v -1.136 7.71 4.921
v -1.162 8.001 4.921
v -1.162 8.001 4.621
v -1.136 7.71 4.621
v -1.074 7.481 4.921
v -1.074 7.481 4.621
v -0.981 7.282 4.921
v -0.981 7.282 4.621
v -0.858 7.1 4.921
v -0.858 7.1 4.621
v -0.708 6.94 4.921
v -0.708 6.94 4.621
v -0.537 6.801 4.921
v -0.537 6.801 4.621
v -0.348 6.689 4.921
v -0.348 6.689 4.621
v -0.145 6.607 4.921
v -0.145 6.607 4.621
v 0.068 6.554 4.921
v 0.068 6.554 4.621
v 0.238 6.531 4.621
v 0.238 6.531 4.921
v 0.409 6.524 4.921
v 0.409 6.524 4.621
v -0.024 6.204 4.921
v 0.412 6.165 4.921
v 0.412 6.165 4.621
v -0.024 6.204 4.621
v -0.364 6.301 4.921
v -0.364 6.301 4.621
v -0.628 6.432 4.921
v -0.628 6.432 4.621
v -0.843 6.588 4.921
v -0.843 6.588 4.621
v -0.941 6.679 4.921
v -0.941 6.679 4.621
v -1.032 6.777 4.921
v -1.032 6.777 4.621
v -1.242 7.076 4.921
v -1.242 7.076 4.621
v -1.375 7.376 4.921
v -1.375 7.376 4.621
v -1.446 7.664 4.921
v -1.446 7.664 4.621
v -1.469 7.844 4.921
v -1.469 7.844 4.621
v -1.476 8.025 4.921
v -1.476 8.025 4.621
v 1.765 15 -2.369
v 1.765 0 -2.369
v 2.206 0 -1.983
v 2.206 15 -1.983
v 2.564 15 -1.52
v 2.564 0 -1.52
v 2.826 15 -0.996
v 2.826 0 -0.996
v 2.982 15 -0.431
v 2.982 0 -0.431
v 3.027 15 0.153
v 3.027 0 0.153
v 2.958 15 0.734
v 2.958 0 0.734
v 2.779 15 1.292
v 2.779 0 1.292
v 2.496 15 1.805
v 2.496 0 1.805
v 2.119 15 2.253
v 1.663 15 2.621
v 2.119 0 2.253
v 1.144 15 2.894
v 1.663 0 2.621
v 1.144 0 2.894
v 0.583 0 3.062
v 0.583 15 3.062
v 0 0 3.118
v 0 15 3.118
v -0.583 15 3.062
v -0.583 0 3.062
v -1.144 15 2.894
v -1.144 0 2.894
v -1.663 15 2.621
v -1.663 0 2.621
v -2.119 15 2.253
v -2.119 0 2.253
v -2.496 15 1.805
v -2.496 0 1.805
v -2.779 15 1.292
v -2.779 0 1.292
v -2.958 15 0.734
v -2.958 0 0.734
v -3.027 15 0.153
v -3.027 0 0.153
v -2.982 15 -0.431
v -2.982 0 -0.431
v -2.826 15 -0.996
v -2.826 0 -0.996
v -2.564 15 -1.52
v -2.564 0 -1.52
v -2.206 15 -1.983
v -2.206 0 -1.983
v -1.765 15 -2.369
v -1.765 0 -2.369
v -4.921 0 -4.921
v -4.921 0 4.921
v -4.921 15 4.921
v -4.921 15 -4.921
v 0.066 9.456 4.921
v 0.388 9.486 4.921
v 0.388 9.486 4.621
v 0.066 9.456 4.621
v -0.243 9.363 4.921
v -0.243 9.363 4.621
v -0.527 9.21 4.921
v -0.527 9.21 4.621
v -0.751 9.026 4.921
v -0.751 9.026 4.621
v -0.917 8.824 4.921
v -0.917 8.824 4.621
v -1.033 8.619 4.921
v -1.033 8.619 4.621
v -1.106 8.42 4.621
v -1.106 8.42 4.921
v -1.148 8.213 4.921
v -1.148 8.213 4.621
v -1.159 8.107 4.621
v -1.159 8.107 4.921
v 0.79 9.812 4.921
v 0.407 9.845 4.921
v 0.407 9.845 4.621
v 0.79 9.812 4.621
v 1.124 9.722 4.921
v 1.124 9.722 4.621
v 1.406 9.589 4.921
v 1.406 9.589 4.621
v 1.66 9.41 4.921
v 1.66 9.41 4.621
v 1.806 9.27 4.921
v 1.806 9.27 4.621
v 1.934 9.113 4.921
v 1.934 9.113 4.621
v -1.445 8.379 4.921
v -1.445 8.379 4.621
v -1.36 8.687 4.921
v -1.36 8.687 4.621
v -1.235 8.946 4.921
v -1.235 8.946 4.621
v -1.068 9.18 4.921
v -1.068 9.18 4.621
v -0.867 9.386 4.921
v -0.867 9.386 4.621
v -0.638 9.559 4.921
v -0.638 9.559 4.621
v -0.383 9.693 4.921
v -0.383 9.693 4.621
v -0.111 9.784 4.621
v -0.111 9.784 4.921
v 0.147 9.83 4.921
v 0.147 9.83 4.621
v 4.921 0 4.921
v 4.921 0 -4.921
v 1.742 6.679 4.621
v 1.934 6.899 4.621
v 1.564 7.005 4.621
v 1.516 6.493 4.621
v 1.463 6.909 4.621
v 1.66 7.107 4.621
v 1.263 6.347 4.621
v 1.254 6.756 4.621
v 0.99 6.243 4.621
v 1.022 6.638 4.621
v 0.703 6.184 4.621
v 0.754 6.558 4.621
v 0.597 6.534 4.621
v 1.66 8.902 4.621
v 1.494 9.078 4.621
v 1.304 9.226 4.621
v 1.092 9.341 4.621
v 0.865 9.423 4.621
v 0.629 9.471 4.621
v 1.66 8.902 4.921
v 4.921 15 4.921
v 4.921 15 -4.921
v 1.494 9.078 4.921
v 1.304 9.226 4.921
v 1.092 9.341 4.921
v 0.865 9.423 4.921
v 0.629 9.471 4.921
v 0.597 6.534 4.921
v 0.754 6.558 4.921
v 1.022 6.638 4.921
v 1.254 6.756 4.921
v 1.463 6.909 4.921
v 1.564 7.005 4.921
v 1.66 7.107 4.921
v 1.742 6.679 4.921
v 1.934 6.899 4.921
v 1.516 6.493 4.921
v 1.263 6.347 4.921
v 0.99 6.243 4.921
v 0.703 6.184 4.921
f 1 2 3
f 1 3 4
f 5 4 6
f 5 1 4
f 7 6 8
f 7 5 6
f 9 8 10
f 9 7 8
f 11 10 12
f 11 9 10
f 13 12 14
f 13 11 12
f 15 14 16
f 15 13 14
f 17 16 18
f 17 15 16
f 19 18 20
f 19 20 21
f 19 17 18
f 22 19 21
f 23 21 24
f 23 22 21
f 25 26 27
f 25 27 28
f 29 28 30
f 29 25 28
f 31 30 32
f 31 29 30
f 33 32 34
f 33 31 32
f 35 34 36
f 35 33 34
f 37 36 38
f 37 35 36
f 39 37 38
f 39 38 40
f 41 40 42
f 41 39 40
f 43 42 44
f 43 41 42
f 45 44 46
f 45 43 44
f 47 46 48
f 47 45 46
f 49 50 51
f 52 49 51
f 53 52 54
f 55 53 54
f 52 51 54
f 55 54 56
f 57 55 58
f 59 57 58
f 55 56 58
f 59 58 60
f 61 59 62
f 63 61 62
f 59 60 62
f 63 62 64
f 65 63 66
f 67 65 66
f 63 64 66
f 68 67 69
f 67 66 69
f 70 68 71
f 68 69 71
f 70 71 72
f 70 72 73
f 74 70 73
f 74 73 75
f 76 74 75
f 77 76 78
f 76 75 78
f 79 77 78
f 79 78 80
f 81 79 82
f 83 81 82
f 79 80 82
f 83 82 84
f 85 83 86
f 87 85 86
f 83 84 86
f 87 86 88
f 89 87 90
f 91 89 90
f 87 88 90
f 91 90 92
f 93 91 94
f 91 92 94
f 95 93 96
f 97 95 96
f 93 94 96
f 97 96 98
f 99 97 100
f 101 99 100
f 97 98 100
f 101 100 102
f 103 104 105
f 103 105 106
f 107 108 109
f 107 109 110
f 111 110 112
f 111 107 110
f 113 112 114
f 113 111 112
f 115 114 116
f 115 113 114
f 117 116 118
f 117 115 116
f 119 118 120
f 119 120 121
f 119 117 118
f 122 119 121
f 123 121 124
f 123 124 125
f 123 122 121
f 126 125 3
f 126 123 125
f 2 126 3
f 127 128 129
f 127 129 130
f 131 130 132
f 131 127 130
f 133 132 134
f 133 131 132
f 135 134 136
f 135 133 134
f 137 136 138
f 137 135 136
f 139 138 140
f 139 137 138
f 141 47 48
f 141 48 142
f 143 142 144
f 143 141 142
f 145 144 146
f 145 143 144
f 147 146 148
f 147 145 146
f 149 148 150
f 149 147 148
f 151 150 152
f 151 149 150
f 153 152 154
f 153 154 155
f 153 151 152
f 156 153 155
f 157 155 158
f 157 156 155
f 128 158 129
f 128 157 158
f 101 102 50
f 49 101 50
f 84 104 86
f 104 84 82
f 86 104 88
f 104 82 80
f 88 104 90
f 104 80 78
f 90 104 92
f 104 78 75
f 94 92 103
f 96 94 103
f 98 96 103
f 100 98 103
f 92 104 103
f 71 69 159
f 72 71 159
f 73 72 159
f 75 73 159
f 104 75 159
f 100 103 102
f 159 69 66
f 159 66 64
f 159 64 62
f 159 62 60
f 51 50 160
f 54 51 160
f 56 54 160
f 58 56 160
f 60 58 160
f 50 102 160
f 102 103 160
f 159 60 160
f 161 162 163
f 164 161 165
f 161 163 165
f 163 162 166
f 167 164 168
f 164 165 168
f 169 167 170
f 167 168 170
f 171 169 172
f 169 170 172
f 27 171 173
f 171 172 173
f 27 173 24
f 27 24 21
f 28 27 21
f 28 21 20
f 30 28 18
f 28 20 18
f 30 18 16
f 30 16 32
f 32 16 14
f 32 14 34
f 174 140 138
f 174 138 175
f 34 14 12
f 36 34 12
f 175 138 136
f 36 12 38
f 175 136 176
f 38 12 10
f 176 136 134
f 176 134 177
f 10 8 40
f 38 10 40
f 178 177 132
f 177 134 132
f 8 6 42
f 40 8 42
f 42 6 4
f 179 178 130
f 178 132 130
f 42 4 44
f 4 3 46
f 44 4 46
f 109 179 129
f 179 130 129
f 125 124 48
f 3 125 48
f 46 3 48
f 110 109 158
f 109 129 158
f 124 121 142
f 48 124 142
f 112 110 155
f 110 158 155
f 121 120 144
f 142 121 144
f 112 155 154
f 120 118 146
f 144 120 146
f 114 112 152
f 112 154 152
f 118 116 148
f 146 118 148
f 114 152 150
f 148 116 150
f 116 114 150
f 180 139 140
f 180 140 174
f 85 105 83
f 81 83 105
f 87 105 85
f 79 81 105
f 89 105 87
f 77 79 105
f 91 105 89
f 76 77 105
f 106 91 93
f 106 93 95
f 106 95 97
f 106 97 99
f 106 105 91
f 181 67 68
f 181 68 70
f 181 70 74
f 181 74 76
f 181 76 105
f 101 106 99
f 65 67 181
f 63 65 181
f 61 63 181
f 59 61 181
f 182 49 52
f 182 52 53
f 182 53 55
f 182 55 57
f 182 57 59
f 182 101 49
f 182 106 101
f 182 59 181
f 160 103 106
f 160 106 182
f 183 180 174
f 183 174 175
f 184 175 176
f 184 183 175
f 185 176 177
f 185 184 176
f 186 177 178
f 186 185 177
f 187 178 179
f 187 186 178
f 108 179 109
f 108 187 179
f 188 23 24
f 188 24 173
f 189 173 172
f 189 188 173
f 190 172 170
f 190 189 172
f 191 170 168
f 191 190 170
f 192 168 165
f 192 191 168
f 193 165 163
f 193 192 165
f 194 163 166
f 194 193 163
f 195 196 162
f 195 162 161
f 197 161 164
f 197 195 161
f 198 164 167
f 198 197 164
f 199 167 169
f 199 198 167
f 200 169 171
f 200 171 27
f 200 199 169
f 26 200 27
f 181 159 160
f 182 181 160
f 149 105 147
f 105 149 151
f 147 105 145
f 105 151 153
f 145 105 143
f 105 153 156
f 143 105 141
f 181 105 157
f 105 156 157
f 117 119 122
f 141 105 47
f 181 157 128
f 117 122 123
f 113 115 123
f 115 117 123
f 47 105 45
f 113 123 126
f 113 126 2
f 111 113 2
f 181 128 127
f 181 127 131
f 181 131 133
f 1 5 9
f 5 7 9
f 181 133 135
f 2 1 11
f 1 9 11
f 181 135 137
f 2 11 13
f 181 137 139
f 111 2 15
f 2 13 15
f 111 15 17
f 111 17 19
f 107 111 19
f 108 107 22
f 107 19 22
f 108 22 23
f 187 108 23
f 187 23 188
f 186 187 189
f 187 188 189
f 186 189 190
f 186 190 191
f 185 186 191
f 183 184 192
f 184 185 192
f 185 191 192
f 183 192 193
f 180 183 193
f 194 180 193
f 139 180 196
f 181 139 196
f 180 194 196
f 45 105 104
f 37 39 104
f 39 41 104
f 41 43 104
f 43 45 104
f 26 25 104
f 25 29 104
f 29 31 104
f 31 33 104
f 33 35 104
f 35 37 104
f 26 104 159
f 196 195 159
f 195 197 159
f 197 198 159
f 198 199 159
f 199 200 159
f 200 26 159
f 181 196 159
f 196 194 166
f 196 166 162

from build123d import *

# Parameters (mm, degrees)
SKETCH1_W           = 9.84142284
SKETCH1_H           = 9.84142284
BOSS_EXTRUDE1_DEPTH = 15
CUT_EXTRUDE1_DEPTH  = 0.3


with BuildPart() as part:
    # Sketch1 → Boss-Extrude1 (new body)
    with BuildSketch(Plane(origin=(0, 0, 0), x_dir=(1, 0, 0), z_dir=(0, 1, 0))):
        Rectangle(SKETCH1_W, SKETCH1_H)
        with BuildLine():
            Line((-1.765045048, 2.369444822), (1.765045048, 2.369444822))
            ThreePointArc((1.765045048, 2.369444822), (0, -3.118257941), (-1.765045048, 2.369444822))
        make_face(mode=Mode.SUBTRACT)
    extrude(amount=BOSS_EXTRUDE1_DEPTH)

    # Sketch2 → Cut-Extrude1 (cut)
    with BuildSketch(Plane.XY.offset(4.92071142)):
        with BuildLine():
            Line((1.934406803, 9.11261109), (1.659567059, 8.902274552))
            add(Edge.make_bspline(
                [(1.659567059, 8.902274552), (1.639961171, 8.925640522), (1.601013724, 8.972057437), (1.538354521, 9.037236982), (1.473052878, 9.098302243), (1.405133757, 9.155544123), (1.333374638, 9.206960889), (1.259513839, 9.255231992), (1.182315794, 9.29849973), (1.075564059, 9.350962716), (0.935916211, 9.405708871), (0.760121372, 9.451612102), (0.576610273, 9.480833278), (0.451412674, 9.483998119), (0.387732123, 9.485607885)],
                knots=[0, 0, 0, 0, 9.1485e-05, 0.000181737, 0.000271024, 0.000359627, 0.000447979, 0.000535687, 0.000624217, 0.000713268, 0.000892422, 0.00107303, 0.001257466, 0.001448389, 0.001448389, 0.001448389, 0.001448389], degree=3))
            add(Edge.make_bspline(
                [(0.387732123, 9.485607885), (0.352648824, 9.485203923), (0.282807831, 9.484399747), (0.179159358, 9.473790622), (0.077446307, 9.458879412), (-0.02226516, 9.436754088), (-0.119848118, 9.408781469), (-0.21594052, 9.375356055), (-0.30915112, 9.334001215), (-0.400769358, 9.288292956), (-0.488548569, 9.236665511), (-0.571603617, 9.180352159), (-0.649631585, 9.119983062), (-0.722694197, 9.055331956), (-0.790866145, 8.986689996), (-0.853653456, 8.913325654), (-0.910838867, 8.83547348), (-0.963555892, 8.754160073), (-1.010768625, 8.669622281), (-1.050298504, 8.581547211), (-1.085303627, 8.491443108), (-1.113002869, 8.398291947), (-1.134927386, 8.302749181), (-1.150055049, 8.204558393), (-1.160543521, 8.103924714), (-1.161343697, 8.035715401), (-1.161747044, 8.001333045)],
                knots=[0, 0, 0, 0, 0.000105206, 0.000209435, 0.000312261, 0.00041348, 0.000515565, 0.000616682, 0.000718413, 0.000821258, 0.000923708, 0.001023662, 0.001122111, 0.001219464, 0.00131614, 0.001412112, 0.001508869, 0.001605718, 0.001702691, 0.001799013, 0.001895107, 0.001992482, 0.002090281, 0.00218895, 0.002290387, 0.00239349, 0.00239349, 0.00239349, 0.00239349], degree=3))
            add(Edge.make_bspline(
                [(-1.161747044, 8.001333045), (-1.160485225, 7.949601726), (-1.15800781, 7.848034141), (-1.135959476, 7.69926353), (-1.102454385, 7.556742856), (-1.052238808, 7.421363014), (-0.990319757, 7.291454656), (-0.912079146, 7.169215803), (-0.821462609, 7.052799238), (-0.717188189, 6.94495629), (-0.602782373, 6.846442565), (-0.480034462, 6.759691983), (-0.349250174, 6.687377101), (-0.211873544, 6.627201155), (-0.06684743, 6.580944427), (0.085567373, 6.548380303), (0.245039368, 6.527138123), (0.354008768, 6.525104435), (0.409466899, 6.524069424)],
                knots=[0, 0, 0, 0, 0.000155106, 0.000304531, 0.000450265, 0.000593548, 0.000736853, 0.000881182, 0.001028026, 0.001178769, 0.001330408, 0.001480379, 0.001628835, 0.001777978, 0.001929641, 0.002084627, 0.002245075, 0.00241136, 0.00241136, 0.00241136, 0.00241136], degree=3))
            add(Edge.make_bspline(
                [(0.409466899, 6.524069424), (0.470569588, 6.525758203), (0.590834297, 6.529082126), (0.767202323, 6.557241375), (0.936038089, 6.602899293), (1.097350675, 6.666797215), (1.250685321, 6.749862503), (1.396281982, 6.850560381), (1.534263552, 6.969848713), (1.617234834, 7.060931842), (1.659567059, 7.107402757)],
                knots=[0, 0, 0, 0, 0.00018322, 0.00036062, 0.000534275, 0.000707044, 0.000879893, 0.001056289, 0.001237208, 0.001425665, 0.001425665, 0.001425665, 0.001425665], degree=3))
            Line((1.659567059, 7.107402757), (1.934406803, 6.899169584))
            add(Edge.make_bspline(
                [(1.934406803, 6.899169584), (1.912288693, 6.870631132), (1.868158417, 6.813690926), (1.7967004, 6.733419216), (1.721423103, 6.65791518), (1.641767393, 6.587787559), (1.558649601, 6.521633094), (1.470577289, 6.461331262), (1.378708257, 6.406040378), (1.283353778, 6.355413454), (1.184615165, 6.310496207), (1.08261073, 6.272042439), (0.977780154, 6.238917549), (0.870118646, 6.211665612), (0.759402889, 6.190394529), (0.646032415, 6.176174854), (0.52976254, 6.166432939), (0.451321119, 6.165545024), (0.411570264, 6.165095065)],
                knots=[0, 0, 0, 0, 0.000108293, 0.000216068, 0.000322162, 0.000427957, 0.000534281, 0.00064066, 0.000747915, 0.000855806, 0.000964371, 0.001073102, 0.001182643, 0.001294024, 0.001406092, 0.001520624, 0.001636667, 0.001755891, 0.001755891, 0.001755891, 0.001755891], degree=3))
            add(Edge.make_bspline(
                [(0.411570264, 6.165095065), (0.373926597, 6.165357057), (0.299490907, 6.165875115), (0.189592155, 6.174267282), (0.082602575, 6.185717019), (-0.021172051, 6.20295715), (-0.122298026, 6.22330149), (-0.219858611, 6.250572747), (-0.314813821, 6.281121914), (-0.406782162, 6.3170269), (-0.495841862, 6.357543083), (-0.581705673, 6.403334642), (-0.664334105, 6.454016507), (-0.744539526, 6.508471517), (-0.82113711, 6.568448819), (-0.894790635, 6.633115453), (-0.965913112, 6.702253464), (-1.009915797, 6.752108317), (-1.032039512, 6.777174392)],
                knots=[0, 0, 0, 0, 0.0001129, 0.000223246, 0.000330481, 0.000435603, 0.000538732, 0.000639764, 0.000739316, 0.000837878, 0.000935767, 0.001032686, 0.001129604, 0.00122645, 0.001323362, 0.001421241, 0.001520399, 0.001620667, 0.001620667, 0.001620667, 0.001620667], degree=3))
            add(Edge.make_bspline(
                [(-1.032039512, 6.777174392), (-1.067475155, 6.82071558), (-1.137918632, 6.907272291), (-1.228044315, 7.047558272), (-1.305191871, 7.194026481), (-1.367567791, 7.34744641), (-1.416330525, 7.507473797), (-1.45011172, 7.674189311), (-1.472063324, 7.847437254), (-1.474573613, 7.965274042), (-1.475849608, 8.025171186)],
                knots=[0, 0, 0, 0, 0.000168306, 0.00033458, 0.000499224, 0.000664315, 0.00083066, 0.00100034, 0.001174094, 0.001353718, 0.001353718, 0.001353718, 0.001353718], degree=3))
            add(Edge.make_bspline(
                [(-1.475849608, 8.025171186), (-1.474294414, 8.08812664), (-1.471234668, 8.211987565), (-1.445238872, 8.393761518), (-1.403420076, 8.567912917), (-1.344023188, 8.734116661), (-1.268717836, 8.893246942), (-1.175691223, 9.044088146), (-1.06602408, 9.187604946), (-0.940576513, 9.321619697), (-0.803009177, 9.44415905), (-0.655690363, 9.551965254), (-0.498908416, 9.64168277), (-0.334390565, 9.716678932), (-0.160904883, 9.774323395), (0.021178486, 9.814676582), (0.211517401, 9.839793698), (0.341379826, 9.842968906), (0.407363533, 9.844582244)],
                knots=[0, 0, 0, 0, 0.000188789, 0.000371431, 0.000549644, 0.000725278, 0.00089996, 0.001076844, 0.001255917, 0.001440951, 0.001626689, 0.001807878, 0.001987546, 0.002167657, 0.002349462, 0.002534866, 0.002726448, 0.002924344, 0.002924344, 0.002924344, 0.002924344], degree=3))
            add(Edge.make_bspline(
                [(0.407363533, 9.844582244), (0.447578005, 9.844100106), (0.527178503, 9.843145762), (0.644931155, 9.83383962), (0.759573482, 9.818326014), (0.871184464, 9.797209944), (0.98030708, 9.771002622), (1.086107321, 9.736862324), (1.189206008, 9.697825793), (1.288952916, 9.652867327), (1.384869466, 9.602400585), (1.476925785, 9.546984962), (1.564390643, 9.486689156), (1.647879492, 9.422025981), (1.725995703, 9.351627422), (1.800957181, 9.277429826), (1.87021826, 9.197296001), (1.912971455, 9.140891068), (1.934406803, 9.11261109)],
                knots=[0, 0, 0, 0, 0.000120626, 0.000238766, 0.000354085, 0.000467531, 0.000579423, 0.000690512, 0.000800803, 0.000910007, 0.001018518, 0.001125773, 0.001232152, 0.001337058, 0.001442329, 0.001547432, 0.001653292, 0.001759736, 0.001759736, 0.001759736, 0.001759736], degree=3))
        make_face()
    extrude(amount=-CUT_EXTRUDE1_DEPTH, mode=Mode.SUBTRACT)


solid = part.part
